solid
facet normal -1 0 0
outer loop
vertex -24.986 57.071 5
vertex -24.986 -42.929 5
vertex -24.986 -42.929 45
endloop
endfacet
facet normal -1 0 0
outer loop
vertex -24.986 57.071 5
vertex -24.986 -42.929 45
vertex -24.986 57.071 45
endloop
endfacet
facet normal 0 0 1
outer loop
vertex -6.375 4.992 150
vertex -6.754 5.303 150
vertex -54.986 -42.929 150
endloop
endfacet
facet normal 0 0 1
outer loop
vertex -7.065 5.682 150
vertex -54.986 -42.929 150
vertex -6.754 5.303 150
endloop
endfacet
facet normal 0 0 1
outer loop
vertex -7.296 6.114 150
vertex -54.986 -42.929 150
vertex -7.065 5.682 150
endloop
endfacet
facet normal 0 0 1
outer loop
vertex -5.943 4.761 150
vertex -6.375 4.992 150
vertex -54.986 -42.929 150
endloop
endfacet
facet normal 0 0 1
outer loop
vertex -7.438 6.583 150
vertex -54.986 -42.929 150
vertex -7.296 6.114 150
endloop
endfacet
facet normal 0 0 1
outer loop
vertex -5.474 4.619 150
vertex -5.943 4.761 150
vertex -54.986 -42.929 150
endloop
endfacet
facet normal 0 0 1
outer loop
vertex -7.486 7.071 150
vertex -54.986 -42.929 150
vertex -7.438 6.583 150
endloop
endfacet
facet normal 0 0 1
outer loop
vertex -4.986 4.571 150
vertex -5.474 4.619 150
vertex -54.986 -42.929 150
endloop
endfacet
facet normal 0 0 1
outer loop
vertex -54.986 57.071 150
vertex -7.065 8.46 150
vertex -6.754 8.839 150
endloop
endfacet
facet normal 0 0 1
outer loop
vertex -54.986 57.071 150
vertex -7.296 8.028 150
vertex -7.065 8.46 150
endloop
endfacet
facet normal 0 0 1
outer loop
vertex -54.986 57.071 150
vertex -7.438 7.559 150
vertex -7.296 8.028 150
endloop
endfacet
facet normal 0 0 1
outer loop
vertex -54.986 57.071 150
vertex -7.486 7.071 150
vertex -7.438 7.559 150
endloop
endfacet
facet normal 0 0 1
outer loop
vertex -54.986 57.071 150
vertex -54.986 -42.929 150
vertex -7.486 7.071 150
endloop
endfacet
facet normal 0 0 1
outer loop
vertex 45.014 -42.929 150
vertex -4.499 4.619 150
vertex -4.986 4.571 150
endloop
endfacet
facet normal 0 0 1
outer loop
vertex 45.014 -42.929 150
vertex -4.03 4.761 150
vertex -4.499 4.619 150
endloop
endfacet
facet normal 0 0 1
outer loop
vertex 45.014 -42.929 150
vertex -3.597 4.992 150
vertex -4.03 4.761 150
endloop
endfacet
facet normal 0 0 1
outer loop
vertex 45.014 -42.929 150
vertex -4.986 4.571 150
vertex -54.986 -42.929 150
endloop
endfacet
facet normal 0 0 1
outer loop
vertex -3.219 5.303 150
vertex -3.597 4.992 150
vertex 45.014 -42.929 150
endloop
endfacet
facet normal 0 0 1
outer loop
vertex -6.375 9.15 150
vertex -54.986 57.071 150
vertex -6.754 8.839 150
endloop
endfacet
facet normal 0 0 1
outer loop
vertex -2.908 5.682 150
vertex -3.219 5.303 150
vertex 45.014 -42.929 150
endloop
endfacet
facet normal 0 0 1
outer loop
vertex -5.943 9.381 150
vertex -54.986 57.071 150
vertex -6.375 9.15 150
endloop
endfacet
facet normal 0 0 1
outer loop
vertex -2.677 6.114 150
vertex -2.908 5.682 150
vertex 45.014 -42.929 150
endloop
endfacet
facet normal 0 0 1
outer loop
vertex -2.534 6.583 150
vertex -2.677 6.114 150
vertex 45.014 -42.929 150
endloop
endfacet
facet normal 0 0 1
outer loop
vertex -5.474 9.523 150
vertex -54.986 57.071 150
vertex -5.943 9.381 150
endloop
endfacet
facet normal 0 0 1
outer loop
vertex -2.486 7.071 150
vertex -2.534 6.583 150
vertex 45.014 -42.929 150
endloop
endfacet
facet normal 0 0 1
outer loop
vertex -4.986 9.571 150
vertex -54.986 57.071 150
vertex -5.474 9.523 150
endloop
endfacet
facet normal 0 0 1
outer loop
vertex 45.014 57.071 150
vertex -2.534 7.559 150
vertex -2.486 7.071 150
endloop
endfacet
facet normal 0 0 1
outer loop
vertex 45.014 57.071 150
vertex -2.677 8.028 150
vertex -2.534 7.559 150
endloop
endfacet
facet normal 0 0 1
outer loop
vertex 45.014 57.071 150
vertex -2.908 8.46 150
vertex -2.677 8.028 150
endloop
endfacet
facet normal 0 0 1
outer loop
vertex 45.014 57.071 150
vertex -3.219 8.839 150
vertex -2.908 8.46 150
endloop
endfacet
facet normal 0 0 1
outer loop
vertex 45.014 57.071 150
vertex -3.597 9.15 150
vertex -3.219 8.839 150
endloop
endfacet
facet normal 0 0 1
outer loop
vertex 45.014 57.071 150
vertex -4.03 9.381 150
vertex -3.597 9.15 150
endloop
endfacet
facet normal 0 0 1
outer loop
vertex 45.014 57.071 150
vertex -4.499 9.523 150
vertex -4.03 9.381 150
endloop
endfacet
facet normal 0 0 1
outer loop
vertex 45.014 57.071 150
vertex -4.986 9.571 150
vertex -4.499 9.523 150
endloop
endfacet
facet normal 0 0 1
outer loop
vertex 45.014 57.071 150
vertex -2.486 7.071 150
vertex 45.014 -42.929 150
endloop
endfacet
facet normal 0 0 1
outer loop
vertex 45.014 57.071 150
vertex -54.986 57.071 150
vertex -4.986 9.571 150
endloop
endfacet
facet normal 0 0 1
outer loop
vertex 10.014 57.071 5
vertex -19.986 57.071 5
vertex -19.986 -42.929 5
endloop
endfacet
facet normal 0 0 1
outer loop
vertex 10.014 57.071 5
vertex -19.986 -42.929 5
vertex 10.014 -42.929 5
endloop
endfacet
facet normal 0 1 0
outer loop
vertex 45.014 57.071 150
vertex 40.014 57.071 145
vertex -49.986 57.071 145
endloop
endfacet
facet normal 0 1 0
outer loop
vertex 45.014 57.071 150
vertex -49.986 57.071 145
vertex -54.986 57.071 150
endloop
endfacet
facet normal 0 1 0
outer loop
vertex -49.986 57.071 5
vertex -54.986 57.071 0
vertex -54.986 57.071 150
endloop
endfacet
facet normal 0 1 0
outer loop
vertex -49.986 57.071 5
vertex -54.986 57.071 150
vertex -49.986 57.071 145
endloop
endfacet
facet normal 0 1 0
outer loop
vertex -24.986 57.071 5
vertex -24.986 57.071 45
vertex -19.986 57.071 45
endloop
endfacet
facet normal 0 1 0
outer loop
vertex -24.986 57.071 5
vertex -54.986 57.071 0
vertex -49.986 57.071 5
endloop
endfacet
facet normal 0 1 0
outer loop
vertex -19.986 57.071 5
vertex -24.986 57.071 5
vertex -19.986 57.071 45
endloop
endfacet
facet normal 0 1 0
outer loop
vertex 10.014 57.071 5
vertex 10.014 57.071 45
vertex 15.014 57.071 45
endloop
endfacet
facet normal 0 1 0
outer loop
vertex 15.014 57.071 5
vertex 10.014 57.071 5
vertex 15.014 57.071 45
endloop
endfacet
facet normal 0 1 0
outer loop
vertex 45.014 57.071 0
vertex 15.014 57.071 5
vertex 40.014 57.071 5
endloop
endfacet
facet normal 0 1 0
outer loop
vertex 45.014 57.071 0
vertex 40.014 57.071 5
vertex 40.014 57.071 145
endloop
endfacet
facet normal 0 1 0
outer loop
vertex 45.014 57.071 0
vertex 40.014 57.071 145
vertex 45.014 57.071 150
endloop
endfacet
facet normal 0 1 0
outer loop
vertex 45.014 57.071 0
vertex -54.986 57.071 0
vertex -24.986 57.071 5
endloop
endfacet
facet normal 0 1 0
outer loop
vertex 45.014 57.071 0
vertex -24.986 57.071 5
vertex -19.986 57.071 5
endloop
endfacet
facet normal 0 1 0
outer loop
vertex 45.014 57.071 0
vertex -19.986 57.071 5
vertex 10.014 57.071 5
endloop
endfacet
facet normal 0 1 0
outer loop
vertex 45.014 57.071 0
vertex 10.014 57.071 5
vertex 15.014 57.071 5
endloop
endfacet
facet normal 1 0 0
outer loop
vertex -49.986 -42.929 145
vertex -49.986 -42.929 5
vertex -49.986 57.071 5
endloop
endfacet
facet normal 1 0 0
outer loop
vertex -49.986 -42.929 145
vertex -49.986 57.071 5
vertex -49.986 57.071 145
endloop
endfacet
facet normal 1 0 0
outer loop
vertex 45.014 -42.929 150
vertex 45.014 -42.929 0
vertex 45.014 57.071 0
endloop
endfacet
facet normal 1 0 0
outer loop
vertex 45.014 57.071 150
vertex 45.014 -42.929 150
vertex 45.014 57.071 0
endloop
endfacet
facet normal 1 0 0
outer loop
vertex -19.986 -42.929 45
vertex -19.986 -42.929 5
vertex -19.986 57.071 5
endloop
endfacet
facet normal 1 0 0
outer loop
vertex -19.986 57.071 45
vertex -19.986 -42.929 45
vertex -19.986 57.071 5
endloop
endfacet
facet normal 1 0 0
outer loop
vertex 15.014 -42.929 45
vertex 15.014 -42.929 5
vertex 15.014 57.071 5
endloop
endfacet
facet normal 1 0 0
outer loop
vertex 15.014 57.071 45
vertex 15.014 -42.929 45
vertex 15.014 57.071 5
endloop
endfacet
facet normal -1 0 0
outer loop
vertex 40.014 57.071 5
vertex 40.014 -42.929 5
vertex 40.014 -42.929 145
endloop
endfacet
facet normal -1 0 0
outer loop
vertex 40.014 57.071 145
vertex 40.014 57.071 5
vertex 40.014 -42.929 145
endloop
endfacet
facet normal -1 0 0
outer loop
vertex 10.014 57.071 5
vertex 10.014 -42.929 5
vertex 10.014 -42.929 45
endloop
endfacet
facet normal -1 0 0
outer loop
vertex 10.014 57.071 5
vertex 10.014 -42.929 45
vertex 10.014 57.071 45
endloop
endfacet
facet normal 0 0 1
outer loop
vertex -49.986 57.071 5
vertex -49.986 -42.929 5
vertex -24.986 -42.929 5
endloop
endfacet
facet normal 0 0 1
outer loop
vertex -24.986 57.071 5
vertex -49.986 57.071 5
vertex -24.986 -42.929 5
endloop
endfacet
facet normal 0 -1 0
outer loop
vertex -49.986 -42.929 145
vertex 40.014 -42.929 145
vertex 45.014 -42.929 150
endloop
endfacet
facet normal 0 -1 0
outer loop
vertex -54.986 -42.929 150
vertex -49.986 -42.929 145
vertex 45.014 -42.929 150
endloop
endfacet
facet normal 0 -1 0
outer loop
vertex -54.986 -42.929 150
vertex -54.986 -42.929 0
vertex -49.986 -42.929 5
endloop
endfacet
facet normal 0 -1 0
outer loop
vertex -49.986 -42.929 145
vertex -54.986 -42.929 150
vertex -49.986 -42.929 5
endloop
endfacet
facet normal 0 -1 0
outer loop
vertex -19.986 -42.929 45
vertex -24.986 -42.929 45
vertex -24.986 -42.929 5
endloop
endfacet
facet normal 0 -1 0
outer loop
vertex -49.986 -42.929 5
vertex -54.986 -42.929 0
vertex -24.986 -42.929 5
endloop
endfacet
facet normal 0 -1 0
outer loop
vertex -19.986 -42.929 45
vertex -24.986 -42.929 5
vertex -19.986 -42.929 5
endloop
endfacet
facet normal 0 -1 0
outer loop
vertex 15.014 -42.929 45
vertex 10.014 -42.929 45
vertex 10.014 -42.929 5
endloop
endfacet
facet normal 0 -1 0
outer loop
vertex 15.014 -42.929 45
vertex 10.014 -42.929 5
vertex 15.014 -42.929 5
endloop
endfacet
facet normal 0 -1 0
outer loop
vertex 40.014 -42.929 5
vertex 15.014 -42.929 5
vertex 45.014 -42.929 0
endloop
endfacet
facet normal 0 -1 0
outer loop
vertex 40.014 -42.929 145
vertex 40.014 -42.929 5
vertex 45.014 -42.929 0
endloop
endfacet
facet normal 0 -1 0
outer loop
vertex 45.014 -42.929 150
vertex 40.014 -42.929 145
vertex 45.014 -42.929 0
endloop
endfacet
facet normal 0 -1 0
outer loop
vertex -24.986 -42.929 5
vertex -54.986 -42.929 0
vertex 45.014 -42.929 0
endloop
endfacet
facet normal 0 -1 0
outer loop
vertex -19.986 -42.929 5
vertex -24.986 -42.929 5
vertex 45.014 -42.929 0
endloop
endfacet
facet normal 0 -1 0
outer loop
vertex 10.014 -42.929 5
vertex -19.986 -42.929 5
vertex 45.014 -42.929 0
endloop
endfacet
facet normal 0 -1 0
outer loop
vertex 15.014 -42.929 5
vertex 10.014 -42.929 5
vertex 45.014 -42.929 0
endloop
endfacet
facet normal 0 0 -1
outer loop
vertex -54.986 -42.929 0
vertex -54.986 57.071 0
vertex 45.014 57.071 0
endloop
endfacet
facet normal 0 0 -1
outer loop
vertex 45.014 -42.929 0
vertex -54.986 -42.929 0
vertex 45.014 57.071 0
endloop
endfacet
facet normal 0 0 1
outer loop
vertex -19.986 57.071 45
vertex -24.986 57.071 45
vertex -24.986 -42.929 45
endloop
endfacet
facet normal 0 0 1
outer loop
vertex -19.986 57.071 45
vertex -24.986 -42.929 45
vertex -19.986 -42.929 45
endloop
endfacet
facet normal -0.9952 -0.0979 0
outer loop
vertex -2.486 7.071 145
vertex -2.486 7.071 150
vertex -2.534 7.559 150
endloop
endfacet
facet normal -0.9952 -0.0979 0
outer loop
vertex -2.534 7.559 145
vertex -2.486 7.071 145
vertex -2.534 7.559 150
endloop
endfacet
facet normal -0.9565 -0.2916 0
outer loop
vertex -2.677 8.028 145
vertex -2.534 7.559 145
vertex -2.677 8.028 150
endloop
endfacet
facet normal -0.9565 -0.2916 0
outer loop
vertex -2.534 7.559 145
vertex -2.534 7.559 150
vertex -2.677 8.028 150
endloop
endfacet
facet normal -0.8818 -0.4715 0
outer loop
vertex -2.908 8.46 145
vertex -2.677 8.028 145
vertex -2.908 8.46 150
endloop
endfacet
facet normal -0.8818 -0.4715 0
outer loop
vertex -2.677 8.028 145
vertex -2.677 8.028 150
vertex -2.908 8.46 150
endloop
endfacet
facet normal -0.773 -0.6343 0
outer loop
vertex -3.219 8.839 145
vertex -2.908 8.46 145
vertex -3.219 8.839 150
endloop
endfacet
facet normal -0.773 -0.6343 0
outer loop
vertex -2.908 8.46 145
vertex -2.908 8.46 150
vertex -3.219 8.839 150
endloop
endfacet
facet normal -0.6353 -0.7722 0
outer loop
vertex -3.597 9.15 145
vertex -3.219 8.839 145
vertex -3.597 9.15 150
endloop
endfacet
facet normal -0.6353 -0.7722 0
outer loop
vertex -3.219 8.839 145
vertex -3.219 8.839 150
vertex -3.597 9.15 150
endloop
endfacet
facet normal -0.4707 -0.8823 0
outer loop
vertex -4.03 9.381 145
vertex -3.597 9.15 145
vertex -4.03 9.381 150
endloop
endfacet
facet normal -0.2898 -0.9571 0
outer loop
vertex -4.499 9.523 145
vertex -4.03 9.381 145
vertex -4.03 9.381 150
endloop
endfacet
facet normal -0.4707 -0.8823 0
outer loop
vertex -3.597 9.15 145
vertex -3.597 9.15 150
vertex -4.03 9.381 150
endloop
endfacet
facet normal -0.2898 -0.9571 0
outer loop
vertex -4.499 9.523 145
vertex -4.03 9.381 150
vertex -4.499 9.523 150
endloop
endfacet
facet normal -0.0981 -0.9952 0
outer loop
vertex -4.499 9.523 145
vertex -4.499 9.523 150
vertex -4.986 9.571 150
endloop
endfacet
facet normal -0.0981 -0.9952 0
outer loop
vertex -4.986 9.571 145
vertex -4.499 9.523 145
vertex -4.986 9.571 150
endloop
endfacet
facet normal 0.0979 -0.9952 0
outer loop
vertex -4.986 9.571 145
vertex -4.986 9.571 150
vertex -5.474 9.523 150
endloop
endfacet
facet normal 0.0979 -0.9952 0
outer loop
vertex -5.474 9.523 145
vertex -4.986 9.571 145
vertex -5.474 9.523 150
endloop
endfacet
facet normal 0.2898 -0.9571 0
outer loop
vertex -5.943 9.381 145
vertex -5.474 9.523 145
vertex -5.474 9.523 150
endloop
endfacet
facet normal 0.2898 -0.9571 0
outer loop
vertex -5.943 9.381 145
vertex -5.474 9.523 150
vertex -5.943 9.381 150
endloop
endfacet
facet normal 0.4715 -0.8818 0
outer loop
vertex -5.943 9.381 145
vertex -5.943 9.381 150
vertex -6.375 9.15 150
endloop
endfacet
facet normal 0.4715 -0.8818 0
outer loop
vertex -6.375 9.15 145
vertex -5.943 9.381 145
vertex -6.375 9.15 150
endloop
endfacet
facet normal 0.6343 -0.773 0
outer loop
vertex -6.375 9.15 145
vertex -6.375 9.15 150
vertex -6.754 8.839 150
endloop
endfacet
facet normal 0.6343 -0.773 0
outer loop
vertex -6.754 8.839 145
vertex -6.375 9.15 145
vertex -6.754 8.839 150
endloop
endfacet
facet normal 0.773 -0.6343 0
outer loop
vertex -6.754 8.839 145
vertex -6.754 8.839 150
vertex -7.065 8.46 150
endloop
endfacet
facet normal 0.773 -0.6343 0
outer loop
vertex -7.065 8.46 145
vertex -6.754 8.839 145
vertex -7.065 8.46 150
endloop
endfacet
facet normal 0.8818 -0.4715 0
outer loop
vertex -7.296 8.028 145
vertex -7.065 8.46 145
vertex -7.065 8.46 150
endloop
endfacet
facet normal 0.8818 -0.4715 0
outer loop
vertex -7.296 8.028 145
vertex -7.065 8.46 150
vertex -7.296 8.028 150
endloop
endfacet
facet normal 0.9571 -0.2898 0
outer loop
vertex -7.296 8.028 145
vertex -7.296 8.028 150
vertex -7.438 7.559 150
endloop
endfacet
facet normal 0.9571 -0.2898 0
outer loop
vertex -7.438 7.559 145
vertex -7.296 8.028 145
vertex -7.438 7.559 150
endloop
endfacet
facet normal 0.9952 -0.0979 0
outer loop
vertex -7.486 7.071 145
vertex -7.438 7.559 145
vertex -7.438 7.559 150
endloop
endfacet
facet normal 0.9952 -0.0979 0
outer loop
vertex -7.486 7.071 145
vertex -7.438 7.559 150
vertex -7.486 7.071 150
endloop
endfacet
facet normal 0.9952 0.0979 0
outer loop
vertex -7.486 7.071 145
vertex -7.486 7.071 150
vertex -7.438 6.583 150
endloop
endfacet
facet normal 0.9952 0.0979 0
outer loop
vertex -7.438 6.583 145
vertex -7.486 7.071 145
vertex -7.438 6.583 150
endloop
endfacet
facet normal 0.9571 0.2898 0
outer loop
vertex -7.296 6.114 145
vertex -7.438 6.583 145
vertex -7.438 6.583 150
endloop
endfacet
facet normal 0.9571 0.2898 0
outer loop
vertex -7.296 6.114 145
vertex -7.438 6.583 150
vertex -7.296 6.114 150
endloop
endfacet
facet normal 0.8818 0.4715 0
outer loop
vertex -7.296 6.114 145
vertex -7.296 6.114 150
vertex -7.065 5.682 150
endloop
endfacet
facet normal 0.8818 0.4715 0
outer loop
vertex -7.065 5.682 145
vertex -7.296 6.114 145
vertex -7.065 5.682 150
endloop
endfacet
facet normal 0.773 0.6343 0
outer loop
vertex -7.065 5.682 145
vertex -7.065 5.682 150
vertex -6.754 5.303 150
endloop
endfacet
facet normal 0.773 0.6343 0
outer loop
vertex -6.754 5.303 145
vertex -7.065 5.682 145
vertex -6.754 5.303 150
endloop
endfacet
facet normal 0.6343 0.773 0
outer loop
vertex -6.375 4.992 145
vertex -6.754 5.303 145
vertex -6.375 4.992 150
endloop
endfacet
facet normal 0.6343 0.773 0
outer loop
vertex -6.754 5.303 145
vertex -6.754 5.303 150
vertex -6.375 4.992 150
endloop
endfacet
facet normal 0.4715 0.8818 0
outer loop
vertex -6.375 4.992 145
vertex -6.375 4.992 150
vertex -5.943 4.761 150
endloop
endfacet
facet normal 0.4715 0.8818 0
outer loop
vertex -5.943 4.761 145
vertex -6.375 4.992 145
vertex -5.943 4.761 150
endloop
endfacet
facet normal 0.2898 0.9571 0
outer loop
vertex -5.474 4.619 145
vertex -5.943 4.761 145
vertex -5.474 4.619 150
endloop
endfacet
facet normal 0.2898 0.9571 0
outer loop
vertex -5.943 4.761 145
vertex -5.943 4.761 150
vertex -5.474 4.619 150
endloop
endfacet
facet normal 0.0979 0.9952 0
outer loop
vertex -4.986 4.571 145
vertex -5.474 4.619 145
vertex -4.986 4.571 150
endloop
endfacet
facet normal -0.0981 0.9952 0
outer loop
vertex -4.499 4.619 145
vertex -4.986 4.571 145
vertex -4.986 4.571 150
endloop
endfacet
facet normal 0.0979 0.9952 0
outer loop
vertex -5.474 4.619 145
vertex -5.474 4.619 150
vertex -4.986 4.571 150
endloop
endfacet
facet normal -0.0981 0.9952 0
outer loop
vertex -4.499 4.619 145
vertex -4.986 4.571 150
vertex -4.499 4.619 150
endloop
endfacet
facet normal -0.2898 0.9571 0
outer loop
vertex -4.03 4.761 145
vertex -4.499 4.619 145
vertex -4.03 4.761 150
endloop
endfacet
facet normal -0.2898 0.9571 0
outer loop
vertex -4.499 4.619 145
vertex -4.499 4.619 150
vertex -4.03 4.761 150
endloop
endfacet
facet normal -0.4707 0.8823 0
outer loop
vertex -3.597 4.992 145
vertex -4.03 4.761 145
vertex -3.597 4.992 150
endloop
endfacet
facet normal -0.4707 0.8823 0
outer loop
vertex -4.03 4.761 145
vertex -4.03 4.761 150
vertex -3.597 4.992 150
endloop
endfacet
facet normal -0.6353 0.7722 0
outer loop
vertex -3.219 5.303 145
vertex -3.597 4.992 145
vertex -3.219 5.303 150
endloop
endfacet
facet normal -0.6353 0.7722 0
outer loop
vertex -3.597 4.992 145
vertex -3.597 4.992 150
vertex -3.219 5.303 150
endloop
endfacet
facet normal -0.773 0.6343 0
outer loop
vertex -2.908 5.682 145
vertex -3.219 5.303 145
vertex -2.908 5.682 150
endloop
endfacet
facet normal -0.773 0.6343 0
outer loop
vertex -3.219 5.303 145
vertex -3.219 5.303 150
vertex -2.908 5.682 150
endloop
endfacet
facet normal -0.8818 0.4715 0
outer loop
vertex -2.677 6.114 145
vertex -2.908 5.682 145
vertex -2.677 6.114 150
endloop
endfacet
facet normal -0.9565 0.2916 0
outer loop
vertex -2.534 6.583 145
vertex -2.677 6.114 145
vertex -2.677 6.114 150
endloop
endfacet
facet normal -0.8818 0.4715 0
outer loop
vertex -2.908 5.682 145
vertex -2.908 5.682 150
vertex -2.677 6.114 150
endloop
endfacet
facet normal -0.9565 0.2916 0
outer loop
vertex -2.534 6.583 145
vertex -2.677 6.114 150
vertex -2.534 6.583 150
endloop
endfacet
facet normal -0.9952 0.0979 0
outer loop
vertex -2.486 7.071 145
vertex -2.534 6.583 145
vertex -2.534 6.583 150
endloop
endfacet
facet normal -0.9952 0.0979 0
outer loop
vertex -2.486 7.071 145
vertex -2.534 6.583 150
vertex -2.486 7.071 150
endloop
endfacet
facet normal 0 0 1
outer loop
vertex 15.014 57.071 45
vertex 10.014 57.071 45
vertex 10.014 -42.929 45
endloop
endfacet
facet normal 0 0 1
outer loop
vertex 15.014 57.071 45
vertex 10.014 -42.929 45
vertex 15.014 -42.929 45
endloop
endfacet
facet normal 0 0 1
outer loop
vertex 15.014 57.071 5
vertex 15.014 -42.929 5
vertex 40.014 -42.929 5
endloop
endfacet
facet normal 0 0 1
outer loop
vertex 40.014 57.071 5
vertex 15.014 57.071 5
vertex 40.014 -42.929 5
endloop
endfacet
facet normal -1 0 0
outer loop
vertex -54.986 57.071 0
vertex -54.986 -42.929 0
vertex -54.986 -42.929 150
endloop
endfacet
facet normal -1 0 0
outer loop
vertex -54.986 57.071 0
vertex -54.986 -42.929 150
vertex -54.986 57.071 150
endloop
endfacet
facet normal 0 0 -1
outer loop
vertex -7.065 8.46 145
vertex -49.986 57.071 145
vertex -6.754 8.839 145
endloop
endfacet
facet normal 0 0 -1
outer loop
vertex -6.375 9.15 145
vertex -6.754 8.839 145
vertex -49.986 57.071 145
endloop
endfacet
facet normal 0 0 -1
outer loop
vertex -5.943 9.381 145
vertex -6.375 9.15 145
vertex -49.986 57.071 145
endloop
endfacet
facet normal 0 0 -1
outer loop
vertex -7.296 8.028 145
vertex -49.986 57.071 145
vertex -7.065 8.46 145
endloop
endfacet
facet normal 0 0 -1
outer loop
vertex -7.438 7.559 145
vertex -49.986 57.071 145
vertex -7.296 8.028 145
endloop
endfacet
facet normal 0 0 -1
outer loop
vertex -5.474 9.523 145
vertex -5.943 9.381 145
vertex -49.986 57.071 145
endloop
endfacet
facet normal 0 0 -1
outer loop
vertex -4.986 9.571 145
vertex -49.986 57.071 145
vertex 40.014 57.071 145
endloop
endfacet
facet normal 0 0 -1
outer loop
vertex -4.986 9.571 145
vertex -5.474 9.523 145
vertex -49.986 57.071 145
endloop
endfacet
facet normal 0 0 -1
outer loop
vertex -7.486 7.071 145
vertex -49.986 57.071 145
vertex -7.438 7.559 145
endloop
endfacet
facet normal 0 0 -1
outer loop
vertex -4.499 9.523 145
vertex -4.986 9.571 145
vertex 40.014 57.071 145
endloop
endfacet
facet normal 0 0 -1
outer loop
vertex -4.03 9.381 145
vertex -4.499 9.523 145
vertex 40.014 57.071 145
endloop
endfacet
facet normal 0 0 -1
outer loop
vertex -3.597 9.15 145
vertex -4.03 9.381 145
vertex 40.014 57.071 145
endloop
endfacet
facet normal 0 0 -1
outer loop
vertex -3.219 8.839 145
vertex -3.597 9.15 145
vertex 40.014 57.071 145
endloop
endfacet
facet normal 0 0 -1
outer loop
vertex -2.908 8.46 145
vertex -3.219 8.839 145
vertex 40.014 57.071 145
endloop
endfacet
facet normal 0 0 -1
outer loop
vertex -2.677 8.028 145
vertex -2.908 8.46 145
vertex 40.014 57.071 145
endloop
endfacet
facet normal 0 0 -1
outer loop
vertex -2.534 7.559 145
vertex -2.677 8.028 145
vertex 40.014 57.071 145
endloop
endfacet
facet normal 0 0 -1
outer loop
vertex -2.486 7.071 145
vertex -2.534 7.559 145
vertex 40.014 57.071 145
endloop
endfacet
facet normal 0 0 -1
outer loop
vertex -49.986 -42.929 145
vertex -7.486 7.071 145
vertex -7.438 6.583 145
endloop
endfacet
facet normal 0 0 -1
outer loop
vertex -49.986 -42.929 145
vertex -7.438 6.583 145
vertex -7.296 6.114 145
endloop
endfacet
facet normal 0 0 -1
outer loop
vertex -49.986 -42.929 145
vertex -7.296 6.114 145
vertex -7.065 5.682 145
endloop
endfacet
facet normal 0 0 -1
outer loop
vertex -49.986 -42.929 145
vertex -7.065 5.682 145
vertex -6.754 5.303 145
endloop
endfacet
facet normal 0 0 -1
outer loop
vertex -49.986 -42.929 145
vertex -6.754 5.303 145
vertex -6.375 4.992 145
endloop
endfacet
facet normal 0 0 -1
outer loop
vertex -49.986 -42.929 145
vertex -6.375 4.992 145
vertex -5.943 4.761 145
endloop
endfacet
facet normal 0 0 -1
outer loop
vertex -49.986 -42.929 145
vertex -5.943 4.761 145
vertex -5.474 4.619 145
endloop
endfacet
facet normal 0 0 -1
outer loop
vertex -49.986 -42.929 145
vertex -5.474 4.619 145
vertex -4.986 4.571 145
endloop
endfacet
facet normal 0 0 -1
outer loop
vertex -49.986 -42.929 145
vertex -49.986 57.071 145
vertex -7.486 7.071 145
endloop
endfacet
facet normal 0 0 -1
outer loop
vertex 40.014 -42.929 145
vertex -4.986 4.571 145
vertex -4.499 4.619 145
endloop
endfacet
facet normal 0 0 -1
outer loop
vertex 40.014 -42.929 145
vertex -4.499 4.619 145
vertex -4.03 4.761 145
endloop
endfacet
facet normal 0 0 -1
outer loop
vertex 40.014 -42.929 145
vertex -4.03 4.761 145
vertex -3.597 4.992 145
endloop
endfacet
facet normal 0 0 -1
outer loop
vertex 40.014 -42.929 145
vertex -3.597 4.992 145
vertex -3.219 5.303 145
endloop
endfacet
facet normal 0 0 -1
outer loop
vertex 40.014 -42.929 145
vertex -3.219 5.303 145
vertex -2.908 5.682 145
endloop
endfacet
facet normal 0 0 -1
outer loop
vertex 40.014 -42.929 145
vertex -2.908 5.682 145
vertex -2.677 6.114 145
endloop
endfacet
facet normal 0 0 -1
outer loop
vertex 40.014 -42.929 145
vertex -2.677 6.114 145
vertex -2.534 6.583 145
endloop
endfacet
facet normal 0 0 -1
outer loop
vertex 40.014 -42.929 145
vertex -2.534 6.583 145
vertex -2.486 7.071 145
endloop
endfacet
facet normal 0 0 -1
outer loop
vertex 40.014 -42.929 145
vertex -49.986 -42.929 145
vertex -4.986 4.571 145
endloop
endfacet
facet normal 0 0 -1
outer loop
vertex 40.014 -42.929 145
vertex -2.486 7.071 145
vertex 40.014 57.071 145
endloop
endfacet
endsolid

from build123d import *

# Parameters (mm, degrees)
F0_W     = 100
F0_H     = 100
F1_DEPTH = 150
F2_W     = 90
F2_H     = 140
F3_DEPTH = 100
F4_R     = 2.5
F5_DEPTH = 50
F6_W     = 5
F6_H     = 100
F7_DEPTH = 40


with BuildPart() as f1:
    # F0 (on Top) → F1 (new body)
    with BuildSketch(Plane.XY):
        with Locations((-4.986377, 7.071109)):
            Rectangle(F0_W, F0_H)
    extrude(amount=F1_DEPTH)

    # F2 (on face) → F3 (cut)
    with BuildSketch(Plane.XZ.offset(42.928891)):
        with Locations((-4.986377, 75)):
            Rectangle(F2_W, F2_H)
    extrude(amount=-F3_DEPTH, mode=Mode.SUBTRACT)

    # F4 (on face) → F5 (cut)
    with BuildSketch(Plane.XY.offset(150)):
        with Locations((-4.986377, 7.071109)):
            Circle(F4_R)
    extrude(amount=-F5_DEPTH, mode=Mode.SUBTRACT)

    # F6 (on face) → F7 (join)
    with BuildSketch(Plane.XY.offset(5)):
        with Locations((-22.486377, 7.071109)):
            Rectangle(F6_W, F6_H)
        with Locations((12.513623, 7.071109)):
            Rectangle(F6_W, F6_H)
    extrude(amount=F7_DEPTH)


solid = f1.part
